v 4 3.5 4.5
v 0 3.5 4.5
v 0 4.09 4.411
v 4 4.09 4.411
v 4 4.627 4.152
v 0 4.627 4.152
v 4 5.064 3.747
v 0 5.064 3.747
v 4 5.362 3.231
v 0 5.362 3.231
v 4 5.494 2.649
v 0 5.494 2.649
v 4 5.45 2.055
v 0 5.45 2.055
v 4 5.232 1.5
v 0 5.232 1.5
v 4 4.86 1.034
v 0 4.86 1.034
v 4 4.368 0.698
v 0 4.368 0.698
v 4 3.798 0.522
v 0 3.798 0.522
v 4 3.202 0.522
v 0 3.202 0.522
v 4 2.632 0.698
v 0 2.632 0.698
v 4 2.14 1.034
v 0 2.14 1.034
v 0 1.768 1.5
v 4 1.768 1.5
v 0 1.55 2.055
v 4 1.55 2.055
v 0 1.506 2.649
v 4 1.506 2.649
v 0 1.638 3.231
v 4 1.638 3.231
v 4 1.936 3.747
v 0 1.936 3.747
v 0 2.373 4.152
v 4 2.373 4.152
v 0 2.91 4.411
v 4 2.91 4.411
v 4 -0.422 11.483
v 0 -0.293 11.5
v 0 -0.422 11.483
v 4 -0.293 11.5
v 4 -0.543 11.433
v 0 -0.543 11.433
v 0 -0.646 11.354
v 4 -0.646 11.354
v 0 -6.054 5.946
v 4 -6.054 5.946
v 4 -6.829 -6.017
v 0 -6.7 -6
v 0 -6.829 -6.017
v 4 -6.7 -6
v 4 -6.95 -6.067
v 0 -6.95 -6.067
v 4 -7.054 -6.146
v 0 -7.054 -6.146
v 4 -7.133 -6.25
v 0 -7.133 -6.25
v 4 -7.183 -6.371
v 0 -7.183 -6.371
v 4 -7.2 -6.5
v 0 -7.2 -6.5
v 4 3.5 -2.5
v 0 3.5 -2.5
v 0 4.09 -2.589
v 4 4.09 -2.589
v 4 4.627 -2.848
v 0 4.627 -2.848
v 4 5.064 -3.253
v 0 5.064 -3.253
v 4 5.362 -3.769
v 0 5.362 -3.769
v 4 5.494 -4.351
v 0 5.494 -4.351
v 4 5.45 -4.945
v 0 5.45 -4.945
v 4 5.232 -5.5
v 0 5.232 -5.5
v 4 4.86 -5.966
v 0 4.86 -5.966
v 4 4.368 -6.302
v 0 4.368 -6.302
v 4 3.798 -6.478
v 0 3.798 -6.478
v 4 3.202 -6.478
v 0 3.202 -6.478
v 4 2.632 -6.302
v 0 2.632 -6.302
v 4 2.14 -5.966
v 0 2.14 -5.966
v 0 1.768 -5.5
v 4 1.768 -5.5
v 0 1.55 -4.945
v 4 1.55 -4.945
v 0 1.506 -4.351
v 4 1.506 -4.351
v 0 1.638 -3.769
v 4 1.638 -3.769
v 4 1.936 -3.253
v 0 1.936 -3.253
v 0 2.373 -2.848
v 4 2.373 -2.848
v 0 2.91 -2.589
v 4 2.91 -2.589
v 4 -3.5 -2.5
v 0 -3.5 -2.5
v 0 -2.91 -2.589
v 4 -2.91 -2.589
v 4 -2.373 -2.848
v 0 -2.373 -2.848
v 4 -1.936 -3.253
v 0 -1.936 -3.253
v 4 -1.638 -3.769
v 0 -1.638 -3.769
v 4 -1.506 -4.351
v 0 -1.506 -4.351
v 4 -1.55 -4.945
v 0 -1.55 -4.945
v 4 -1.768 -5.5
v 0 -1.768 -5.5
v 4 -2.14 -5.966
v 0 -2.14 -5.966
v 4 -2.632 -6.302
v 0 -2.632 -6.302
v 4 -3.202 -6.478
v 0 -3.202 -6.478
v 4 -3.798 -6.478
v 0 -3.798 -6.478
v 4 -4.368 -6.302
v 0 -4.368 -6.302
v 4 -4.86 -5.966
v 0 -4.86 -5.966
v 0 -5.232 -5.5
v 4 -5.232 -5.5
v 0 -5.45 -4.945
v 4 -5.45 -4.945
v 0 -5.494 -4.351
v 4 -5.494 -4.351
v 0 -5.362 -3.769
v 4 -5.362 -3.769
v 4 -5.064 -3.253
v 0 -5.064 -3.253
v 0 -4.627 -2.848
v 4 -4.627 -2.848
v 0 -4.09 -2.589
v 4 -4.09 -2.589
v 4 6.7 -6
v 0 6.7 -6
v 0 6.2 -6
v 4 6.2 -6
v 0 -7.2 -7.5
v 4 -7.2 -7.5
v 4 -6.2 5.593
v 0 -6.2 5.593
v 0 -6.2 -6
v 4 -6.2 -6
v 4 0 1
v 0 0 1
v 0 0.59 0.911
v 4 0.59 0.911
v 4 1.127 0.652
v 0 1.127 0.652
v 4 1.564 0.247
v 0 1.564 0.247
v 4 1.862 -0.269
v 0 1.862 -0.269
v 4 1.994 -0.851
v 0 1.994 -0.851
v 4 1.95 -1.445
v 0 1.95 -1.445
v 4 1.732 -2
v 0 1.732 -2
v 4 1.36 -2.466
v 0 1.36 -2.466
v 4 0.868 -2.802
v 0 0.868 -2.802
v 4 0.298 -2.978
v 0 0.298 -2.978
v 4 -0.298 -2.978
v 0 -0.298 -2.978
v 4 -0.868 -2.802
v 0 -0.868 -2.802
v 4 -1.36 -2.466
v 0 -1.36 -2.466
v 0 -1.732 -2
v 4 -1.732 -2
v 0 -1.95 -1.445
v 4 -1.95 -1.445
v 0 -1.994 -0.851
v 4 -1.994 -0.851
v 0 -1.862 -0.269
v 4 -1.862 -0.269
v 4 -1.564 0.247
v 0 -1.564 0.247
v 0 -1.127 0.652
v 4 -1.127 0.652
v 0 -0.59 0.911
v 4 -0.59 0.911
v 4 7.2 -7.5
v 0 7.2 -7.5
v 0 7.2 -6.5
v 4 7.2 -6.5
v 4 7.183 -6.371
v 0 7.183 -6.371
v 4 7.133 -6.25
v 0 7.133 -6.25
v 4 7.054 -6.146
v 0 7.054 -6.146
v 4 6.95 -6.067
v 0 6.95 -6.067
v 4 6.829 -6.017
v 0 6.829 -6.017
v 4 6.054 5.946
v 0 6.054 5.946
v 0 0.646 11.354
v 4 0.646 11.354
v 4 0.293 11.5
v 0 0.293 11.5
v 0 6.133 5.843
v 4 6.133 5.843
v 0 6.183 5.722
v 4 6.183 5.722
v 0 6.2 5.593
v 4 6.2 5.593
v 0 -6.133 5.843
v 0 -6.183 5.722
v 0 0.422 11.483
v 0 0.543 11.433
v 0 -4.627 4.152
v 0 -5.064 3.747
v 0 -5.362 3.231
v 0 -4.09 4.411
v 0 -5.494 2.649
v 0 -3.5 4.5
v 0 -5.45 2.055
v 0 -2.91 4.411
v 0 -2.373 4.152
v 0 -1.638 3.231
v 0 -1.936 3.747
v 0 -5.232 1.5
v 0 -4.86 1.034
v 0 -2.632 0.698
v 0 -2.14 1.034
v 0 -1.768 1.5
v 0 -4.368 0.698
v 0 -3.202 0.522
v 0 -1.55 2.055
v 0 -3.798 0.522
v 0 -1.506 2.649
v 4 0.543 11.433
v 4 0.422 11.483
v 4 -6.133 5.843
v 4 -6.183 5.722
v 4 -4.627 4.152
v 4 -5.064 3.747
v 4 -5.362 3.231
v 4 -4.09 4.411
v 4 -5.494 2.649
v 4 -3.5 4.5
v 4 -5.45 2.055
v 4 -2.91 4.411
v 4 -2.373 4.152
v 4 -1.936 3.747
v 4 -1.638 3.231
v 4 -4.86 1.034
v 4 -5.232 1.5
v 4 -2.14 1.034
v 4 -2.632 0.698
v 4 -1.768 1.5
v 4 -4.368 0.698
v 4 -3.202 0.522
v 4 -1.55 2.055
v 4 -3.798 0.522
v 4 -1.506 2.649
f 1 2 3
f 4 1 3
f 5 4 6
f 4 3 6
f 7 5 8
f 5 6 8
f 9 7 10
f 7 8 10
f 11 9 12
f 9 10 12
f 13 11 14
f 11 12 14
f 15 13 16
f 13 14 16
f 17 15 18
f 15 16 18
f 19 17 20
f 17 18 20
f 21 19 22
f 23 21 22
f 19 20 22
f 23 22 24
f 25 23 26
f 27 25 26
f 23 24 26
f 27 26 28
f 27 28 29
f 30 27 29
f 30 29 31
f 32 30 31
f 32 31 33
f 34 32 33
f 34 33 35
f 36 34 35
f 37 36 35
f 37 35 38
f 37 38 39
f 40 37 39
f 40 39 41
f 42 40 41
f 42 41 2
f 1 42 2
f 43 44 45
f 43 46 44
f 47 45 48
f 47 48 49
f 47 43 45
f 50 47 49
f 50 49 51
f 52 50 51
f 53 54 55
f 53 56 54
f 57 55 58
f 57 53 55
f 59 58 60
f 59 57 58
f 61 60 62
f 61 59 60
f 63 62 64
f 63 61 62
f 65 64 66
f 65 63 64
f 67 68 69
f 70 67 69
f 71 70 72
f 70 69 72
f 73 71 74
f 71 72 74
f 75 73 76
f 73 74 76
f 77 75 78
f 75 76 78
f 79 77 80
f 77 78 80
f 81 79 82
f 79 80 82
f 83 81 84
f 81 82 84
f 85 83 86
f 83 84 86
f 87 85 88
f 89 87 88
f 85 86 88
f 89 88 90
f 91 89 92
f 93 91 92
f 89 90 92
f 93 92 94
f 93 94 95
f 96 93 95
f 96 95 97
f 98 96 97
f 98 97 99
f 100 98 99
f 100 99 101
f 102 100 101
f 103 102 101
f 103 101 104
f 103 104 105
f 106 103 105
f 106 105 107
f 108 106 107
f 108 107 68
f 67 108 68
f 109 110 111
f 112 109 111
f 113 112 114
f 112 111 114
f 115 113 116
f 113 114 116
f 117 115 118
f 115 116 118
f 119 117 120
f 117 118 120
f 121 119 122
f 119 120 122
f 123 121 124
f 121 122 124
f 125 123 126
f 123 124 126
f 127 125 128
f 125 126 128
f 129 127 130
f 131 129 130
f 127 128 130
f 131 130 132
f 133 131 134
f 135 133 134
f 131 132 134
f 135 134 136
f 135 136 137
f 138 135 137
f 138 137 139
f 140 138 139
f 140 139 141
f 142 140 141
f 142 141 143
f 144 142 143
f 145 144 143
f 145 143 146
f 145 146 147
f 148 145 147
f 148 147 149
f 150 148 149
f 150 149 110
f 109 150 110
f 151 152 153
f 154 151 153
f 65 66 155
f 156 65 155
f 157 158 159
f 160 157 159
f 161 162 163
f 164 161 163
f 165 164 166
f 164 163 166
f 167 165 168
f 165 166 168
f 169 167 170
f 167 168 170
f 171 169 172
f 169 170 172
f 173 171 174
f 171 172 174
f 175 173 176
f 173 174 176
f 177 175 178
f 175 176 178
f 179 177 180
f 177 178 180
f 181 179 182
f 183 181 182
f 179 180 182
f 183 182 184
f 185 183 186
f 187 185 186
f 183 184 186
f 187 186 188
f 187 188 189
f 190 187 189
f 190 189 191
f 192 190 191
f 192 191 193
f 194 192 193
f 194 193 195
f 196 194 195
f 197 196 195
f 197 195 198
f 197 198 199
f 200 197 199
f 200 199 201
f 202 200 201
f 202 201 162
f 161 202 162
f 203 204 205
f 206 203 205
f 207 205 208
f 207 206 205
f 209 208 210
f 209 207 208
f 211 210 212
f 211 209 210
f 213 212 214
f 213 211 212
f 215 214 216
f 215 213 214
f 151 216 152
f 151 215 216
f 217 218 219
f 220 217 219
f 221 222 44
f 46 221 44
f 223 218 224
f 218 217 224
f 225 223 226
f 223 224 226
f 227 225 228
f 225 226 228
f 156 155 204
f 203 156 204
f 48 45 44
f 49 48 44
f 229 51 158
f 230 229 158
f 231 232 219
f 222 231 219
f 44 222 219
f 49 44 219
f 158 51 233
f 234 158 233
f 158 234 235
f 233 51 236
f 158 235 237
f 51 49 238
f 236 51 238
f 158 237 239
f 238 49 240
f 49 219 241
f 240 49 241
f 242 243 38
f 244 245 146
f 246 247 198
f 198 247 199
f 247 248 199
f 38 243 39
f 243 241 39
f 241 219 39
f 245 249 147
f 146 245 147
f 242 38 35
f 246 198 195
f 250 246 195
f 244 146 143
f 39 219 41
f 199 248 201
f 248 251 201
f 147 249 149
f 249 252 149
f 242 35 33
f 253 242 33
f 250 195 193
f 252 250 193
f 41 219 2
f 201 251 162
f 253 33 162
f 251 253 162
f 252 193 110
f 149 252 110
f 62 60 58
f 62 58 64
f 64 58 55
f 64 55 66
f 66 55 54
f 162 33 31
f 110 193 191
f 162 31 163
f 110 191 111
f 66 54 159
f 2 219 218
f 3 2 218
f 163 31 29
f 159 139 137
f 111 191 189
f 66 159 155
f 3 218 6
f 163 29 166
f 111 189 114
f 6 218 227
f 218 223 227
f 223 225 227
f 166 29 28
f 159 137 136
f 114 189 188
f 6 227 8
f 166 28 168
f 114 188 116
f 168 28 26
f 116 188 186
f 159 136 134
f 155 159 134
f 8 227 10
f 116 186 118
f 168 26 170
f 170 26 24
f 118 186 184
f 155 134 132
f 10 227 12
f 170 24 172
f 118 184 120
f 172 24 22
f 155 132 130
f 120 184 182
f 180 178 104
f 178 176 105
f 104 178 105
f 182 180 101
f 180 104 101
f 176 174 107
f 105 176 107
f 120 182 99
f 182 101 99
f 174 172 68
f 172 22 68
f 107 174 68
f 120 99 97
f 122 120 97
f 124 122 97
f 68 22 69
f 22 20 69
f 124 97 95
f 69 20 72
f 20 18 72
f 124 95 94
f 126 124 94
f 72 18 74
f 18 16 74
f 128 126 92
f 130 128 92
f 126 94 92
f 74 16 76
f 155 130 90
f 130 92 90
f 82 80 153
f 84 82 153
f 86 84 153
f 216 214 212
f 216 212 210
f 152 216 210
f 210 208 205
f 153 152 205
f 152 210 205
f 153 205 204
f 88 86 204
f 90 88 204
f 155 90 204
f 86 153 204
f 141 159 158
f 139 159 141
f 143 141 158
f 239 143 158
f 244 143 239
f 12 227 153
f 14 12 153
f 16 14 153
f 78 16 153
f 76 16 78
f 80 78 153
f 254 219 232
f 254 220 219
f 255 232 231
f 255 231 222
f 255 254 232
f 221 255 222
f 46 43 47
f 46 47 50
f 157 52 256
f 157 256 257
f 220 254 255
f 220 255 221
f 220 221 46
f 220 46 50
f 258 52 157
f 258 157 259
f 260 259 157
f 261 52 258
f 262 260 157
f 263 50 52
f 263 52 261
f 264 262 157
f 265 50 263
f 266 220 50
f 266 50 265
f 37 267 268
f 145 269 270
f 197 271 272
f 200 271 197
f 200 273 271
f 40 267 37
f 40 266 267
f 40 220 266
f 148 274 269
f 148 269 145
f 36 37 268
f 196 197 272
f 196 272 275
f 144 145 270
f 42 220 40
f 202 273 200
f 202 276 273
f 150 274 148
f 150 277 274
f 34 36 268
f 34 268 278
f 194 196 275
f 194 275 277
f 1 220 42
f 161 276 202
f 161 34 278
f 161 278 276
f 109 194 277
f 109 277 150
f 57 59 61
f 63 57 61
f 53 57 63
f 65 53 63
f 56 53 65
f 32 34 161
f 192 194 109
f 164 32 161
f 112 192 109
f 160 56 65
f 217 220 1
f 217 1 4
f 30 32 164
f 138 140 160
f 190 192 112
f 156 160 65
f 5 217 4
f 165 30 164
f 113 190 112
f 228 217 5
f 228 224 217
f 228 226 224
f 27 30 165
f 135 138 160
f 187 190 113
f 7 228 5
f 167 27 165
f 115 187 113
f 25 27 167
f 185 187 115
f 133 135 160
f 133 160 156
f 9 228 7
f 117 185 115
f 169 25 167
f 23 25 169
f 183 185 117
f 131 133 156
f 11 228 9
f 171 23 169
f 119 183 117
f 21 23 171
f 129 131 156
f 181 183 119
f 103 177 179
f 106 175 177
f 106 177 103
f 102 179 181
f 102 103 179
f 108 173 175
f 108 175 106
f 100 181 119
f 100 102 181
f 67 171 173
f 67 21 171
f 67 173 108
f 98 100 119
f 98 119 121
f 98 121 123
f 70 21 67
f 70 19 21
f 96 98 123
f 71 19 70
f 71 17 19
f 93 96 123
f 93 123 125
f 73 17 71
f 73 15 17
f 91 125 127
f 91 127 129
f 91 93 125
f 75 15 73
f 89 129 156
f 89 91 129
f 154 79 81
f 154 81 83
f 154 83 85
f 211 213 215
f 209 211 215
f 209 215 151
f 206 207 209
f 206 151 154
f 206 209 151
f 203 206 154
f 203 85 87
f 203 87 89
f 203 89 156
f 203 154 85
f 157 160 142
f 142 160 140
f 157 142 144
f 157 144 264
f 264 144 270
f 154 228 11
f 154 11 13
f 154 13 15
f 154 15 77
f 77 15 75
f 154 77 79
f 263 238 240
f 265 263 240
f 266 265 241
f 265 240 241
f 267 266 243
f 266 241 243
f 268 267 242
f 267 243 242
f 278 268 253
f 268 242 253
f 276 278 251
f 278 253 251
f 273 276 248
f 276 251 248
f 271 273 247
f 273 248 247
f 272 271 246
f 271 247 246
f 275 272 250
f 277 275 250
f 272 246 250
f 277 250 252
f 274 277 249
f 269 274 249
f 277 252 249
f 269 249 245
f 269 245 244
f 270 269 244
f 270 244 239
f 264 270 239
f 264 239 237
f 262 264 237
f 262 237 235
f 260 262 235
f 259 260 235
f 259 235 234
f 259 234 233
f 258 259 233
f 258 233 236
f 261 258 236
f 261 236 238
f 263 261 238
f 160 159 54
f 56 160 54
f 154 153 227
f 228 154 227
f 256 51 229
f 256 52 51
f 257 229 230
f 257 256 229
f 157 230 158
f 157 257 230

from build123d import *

# Parameters (mm, degrees)
BOSS_EXTRUDE1_DEPTH                = 4
FILLET2_R                          = 0.5
F_4_0MM_MASS_REDUCTION_HOLES_D     = 4
F_4_0MM_MASS_REDUCTION_HOLES_DEPTH = 9.525
F_4_0MM_MASS_REDUCTION_HOLES_TIP   = 1.201721238


with BuildPart() as part:
    # Sketch1 → Boss-Extrude1 (new body)
    with BuildSketch(Plane(origin=(0, 0, 0), x_dir=(0, 0, -1), z_dir=(1, 0, 0))):
        Polygon((-5.8, 6.2), (-11.5, 0.5), (-11.5, -0.5), (-5.8, -6.2), (6, -6.2), (6, -7.2), (7.5, -7.2), (7.5, 7.2), (6, 7.2), (6, 6.2), align=None)
    extrude(amount=BOSS_EXTRUDE1_DEPTH)

    # Fillet2
    fillet2_edges = [part.edges().sort_by_distance(p)[0] for p in [
        (2, -6.2, 5.8),
        (2, -0.5, 11.5),
        (2, 0.5, 11.5),
        (2, 6.2, 5.8),
        (2, 7.2, -6),
        (2, -7.2, -6),
    ]]
    fillet(fillet2_edges, radius=FILLET2_R)

    # Ø4.0mm mass reduction holes
    with Locations(Plane(origin=(4, 0, 0), x_dir=(0, 0, -1), z_dir=(1, 0, 0))):
        with Locations((4.5, -3.5), (4.5, 3.5), (-2.5, -3.5), (-2.5, 3.5), (1, 0)):
            Hole(F_4_0MM_MASS_REDUCTION_HOLES_D / 2, depth=F_4_0MM_MASS_REDUCTION_HOLES_DEPTH)
            with Locations((0, 0, -(F_4_0MM_MASS_REDUCTION_HOLES_DEPTH + F_4_0MM_MASS_REDUCTION_HOLES_TIP / 2))):  # 118° drill point
                Cone(0, F_4_0MM_MASS_REDUCTION_HOLES_D / 2, F_4_0MM_MASS_REDUCTION_HOLES_TIP, mode=Mode.SUBTRACT)


solid = part.part
